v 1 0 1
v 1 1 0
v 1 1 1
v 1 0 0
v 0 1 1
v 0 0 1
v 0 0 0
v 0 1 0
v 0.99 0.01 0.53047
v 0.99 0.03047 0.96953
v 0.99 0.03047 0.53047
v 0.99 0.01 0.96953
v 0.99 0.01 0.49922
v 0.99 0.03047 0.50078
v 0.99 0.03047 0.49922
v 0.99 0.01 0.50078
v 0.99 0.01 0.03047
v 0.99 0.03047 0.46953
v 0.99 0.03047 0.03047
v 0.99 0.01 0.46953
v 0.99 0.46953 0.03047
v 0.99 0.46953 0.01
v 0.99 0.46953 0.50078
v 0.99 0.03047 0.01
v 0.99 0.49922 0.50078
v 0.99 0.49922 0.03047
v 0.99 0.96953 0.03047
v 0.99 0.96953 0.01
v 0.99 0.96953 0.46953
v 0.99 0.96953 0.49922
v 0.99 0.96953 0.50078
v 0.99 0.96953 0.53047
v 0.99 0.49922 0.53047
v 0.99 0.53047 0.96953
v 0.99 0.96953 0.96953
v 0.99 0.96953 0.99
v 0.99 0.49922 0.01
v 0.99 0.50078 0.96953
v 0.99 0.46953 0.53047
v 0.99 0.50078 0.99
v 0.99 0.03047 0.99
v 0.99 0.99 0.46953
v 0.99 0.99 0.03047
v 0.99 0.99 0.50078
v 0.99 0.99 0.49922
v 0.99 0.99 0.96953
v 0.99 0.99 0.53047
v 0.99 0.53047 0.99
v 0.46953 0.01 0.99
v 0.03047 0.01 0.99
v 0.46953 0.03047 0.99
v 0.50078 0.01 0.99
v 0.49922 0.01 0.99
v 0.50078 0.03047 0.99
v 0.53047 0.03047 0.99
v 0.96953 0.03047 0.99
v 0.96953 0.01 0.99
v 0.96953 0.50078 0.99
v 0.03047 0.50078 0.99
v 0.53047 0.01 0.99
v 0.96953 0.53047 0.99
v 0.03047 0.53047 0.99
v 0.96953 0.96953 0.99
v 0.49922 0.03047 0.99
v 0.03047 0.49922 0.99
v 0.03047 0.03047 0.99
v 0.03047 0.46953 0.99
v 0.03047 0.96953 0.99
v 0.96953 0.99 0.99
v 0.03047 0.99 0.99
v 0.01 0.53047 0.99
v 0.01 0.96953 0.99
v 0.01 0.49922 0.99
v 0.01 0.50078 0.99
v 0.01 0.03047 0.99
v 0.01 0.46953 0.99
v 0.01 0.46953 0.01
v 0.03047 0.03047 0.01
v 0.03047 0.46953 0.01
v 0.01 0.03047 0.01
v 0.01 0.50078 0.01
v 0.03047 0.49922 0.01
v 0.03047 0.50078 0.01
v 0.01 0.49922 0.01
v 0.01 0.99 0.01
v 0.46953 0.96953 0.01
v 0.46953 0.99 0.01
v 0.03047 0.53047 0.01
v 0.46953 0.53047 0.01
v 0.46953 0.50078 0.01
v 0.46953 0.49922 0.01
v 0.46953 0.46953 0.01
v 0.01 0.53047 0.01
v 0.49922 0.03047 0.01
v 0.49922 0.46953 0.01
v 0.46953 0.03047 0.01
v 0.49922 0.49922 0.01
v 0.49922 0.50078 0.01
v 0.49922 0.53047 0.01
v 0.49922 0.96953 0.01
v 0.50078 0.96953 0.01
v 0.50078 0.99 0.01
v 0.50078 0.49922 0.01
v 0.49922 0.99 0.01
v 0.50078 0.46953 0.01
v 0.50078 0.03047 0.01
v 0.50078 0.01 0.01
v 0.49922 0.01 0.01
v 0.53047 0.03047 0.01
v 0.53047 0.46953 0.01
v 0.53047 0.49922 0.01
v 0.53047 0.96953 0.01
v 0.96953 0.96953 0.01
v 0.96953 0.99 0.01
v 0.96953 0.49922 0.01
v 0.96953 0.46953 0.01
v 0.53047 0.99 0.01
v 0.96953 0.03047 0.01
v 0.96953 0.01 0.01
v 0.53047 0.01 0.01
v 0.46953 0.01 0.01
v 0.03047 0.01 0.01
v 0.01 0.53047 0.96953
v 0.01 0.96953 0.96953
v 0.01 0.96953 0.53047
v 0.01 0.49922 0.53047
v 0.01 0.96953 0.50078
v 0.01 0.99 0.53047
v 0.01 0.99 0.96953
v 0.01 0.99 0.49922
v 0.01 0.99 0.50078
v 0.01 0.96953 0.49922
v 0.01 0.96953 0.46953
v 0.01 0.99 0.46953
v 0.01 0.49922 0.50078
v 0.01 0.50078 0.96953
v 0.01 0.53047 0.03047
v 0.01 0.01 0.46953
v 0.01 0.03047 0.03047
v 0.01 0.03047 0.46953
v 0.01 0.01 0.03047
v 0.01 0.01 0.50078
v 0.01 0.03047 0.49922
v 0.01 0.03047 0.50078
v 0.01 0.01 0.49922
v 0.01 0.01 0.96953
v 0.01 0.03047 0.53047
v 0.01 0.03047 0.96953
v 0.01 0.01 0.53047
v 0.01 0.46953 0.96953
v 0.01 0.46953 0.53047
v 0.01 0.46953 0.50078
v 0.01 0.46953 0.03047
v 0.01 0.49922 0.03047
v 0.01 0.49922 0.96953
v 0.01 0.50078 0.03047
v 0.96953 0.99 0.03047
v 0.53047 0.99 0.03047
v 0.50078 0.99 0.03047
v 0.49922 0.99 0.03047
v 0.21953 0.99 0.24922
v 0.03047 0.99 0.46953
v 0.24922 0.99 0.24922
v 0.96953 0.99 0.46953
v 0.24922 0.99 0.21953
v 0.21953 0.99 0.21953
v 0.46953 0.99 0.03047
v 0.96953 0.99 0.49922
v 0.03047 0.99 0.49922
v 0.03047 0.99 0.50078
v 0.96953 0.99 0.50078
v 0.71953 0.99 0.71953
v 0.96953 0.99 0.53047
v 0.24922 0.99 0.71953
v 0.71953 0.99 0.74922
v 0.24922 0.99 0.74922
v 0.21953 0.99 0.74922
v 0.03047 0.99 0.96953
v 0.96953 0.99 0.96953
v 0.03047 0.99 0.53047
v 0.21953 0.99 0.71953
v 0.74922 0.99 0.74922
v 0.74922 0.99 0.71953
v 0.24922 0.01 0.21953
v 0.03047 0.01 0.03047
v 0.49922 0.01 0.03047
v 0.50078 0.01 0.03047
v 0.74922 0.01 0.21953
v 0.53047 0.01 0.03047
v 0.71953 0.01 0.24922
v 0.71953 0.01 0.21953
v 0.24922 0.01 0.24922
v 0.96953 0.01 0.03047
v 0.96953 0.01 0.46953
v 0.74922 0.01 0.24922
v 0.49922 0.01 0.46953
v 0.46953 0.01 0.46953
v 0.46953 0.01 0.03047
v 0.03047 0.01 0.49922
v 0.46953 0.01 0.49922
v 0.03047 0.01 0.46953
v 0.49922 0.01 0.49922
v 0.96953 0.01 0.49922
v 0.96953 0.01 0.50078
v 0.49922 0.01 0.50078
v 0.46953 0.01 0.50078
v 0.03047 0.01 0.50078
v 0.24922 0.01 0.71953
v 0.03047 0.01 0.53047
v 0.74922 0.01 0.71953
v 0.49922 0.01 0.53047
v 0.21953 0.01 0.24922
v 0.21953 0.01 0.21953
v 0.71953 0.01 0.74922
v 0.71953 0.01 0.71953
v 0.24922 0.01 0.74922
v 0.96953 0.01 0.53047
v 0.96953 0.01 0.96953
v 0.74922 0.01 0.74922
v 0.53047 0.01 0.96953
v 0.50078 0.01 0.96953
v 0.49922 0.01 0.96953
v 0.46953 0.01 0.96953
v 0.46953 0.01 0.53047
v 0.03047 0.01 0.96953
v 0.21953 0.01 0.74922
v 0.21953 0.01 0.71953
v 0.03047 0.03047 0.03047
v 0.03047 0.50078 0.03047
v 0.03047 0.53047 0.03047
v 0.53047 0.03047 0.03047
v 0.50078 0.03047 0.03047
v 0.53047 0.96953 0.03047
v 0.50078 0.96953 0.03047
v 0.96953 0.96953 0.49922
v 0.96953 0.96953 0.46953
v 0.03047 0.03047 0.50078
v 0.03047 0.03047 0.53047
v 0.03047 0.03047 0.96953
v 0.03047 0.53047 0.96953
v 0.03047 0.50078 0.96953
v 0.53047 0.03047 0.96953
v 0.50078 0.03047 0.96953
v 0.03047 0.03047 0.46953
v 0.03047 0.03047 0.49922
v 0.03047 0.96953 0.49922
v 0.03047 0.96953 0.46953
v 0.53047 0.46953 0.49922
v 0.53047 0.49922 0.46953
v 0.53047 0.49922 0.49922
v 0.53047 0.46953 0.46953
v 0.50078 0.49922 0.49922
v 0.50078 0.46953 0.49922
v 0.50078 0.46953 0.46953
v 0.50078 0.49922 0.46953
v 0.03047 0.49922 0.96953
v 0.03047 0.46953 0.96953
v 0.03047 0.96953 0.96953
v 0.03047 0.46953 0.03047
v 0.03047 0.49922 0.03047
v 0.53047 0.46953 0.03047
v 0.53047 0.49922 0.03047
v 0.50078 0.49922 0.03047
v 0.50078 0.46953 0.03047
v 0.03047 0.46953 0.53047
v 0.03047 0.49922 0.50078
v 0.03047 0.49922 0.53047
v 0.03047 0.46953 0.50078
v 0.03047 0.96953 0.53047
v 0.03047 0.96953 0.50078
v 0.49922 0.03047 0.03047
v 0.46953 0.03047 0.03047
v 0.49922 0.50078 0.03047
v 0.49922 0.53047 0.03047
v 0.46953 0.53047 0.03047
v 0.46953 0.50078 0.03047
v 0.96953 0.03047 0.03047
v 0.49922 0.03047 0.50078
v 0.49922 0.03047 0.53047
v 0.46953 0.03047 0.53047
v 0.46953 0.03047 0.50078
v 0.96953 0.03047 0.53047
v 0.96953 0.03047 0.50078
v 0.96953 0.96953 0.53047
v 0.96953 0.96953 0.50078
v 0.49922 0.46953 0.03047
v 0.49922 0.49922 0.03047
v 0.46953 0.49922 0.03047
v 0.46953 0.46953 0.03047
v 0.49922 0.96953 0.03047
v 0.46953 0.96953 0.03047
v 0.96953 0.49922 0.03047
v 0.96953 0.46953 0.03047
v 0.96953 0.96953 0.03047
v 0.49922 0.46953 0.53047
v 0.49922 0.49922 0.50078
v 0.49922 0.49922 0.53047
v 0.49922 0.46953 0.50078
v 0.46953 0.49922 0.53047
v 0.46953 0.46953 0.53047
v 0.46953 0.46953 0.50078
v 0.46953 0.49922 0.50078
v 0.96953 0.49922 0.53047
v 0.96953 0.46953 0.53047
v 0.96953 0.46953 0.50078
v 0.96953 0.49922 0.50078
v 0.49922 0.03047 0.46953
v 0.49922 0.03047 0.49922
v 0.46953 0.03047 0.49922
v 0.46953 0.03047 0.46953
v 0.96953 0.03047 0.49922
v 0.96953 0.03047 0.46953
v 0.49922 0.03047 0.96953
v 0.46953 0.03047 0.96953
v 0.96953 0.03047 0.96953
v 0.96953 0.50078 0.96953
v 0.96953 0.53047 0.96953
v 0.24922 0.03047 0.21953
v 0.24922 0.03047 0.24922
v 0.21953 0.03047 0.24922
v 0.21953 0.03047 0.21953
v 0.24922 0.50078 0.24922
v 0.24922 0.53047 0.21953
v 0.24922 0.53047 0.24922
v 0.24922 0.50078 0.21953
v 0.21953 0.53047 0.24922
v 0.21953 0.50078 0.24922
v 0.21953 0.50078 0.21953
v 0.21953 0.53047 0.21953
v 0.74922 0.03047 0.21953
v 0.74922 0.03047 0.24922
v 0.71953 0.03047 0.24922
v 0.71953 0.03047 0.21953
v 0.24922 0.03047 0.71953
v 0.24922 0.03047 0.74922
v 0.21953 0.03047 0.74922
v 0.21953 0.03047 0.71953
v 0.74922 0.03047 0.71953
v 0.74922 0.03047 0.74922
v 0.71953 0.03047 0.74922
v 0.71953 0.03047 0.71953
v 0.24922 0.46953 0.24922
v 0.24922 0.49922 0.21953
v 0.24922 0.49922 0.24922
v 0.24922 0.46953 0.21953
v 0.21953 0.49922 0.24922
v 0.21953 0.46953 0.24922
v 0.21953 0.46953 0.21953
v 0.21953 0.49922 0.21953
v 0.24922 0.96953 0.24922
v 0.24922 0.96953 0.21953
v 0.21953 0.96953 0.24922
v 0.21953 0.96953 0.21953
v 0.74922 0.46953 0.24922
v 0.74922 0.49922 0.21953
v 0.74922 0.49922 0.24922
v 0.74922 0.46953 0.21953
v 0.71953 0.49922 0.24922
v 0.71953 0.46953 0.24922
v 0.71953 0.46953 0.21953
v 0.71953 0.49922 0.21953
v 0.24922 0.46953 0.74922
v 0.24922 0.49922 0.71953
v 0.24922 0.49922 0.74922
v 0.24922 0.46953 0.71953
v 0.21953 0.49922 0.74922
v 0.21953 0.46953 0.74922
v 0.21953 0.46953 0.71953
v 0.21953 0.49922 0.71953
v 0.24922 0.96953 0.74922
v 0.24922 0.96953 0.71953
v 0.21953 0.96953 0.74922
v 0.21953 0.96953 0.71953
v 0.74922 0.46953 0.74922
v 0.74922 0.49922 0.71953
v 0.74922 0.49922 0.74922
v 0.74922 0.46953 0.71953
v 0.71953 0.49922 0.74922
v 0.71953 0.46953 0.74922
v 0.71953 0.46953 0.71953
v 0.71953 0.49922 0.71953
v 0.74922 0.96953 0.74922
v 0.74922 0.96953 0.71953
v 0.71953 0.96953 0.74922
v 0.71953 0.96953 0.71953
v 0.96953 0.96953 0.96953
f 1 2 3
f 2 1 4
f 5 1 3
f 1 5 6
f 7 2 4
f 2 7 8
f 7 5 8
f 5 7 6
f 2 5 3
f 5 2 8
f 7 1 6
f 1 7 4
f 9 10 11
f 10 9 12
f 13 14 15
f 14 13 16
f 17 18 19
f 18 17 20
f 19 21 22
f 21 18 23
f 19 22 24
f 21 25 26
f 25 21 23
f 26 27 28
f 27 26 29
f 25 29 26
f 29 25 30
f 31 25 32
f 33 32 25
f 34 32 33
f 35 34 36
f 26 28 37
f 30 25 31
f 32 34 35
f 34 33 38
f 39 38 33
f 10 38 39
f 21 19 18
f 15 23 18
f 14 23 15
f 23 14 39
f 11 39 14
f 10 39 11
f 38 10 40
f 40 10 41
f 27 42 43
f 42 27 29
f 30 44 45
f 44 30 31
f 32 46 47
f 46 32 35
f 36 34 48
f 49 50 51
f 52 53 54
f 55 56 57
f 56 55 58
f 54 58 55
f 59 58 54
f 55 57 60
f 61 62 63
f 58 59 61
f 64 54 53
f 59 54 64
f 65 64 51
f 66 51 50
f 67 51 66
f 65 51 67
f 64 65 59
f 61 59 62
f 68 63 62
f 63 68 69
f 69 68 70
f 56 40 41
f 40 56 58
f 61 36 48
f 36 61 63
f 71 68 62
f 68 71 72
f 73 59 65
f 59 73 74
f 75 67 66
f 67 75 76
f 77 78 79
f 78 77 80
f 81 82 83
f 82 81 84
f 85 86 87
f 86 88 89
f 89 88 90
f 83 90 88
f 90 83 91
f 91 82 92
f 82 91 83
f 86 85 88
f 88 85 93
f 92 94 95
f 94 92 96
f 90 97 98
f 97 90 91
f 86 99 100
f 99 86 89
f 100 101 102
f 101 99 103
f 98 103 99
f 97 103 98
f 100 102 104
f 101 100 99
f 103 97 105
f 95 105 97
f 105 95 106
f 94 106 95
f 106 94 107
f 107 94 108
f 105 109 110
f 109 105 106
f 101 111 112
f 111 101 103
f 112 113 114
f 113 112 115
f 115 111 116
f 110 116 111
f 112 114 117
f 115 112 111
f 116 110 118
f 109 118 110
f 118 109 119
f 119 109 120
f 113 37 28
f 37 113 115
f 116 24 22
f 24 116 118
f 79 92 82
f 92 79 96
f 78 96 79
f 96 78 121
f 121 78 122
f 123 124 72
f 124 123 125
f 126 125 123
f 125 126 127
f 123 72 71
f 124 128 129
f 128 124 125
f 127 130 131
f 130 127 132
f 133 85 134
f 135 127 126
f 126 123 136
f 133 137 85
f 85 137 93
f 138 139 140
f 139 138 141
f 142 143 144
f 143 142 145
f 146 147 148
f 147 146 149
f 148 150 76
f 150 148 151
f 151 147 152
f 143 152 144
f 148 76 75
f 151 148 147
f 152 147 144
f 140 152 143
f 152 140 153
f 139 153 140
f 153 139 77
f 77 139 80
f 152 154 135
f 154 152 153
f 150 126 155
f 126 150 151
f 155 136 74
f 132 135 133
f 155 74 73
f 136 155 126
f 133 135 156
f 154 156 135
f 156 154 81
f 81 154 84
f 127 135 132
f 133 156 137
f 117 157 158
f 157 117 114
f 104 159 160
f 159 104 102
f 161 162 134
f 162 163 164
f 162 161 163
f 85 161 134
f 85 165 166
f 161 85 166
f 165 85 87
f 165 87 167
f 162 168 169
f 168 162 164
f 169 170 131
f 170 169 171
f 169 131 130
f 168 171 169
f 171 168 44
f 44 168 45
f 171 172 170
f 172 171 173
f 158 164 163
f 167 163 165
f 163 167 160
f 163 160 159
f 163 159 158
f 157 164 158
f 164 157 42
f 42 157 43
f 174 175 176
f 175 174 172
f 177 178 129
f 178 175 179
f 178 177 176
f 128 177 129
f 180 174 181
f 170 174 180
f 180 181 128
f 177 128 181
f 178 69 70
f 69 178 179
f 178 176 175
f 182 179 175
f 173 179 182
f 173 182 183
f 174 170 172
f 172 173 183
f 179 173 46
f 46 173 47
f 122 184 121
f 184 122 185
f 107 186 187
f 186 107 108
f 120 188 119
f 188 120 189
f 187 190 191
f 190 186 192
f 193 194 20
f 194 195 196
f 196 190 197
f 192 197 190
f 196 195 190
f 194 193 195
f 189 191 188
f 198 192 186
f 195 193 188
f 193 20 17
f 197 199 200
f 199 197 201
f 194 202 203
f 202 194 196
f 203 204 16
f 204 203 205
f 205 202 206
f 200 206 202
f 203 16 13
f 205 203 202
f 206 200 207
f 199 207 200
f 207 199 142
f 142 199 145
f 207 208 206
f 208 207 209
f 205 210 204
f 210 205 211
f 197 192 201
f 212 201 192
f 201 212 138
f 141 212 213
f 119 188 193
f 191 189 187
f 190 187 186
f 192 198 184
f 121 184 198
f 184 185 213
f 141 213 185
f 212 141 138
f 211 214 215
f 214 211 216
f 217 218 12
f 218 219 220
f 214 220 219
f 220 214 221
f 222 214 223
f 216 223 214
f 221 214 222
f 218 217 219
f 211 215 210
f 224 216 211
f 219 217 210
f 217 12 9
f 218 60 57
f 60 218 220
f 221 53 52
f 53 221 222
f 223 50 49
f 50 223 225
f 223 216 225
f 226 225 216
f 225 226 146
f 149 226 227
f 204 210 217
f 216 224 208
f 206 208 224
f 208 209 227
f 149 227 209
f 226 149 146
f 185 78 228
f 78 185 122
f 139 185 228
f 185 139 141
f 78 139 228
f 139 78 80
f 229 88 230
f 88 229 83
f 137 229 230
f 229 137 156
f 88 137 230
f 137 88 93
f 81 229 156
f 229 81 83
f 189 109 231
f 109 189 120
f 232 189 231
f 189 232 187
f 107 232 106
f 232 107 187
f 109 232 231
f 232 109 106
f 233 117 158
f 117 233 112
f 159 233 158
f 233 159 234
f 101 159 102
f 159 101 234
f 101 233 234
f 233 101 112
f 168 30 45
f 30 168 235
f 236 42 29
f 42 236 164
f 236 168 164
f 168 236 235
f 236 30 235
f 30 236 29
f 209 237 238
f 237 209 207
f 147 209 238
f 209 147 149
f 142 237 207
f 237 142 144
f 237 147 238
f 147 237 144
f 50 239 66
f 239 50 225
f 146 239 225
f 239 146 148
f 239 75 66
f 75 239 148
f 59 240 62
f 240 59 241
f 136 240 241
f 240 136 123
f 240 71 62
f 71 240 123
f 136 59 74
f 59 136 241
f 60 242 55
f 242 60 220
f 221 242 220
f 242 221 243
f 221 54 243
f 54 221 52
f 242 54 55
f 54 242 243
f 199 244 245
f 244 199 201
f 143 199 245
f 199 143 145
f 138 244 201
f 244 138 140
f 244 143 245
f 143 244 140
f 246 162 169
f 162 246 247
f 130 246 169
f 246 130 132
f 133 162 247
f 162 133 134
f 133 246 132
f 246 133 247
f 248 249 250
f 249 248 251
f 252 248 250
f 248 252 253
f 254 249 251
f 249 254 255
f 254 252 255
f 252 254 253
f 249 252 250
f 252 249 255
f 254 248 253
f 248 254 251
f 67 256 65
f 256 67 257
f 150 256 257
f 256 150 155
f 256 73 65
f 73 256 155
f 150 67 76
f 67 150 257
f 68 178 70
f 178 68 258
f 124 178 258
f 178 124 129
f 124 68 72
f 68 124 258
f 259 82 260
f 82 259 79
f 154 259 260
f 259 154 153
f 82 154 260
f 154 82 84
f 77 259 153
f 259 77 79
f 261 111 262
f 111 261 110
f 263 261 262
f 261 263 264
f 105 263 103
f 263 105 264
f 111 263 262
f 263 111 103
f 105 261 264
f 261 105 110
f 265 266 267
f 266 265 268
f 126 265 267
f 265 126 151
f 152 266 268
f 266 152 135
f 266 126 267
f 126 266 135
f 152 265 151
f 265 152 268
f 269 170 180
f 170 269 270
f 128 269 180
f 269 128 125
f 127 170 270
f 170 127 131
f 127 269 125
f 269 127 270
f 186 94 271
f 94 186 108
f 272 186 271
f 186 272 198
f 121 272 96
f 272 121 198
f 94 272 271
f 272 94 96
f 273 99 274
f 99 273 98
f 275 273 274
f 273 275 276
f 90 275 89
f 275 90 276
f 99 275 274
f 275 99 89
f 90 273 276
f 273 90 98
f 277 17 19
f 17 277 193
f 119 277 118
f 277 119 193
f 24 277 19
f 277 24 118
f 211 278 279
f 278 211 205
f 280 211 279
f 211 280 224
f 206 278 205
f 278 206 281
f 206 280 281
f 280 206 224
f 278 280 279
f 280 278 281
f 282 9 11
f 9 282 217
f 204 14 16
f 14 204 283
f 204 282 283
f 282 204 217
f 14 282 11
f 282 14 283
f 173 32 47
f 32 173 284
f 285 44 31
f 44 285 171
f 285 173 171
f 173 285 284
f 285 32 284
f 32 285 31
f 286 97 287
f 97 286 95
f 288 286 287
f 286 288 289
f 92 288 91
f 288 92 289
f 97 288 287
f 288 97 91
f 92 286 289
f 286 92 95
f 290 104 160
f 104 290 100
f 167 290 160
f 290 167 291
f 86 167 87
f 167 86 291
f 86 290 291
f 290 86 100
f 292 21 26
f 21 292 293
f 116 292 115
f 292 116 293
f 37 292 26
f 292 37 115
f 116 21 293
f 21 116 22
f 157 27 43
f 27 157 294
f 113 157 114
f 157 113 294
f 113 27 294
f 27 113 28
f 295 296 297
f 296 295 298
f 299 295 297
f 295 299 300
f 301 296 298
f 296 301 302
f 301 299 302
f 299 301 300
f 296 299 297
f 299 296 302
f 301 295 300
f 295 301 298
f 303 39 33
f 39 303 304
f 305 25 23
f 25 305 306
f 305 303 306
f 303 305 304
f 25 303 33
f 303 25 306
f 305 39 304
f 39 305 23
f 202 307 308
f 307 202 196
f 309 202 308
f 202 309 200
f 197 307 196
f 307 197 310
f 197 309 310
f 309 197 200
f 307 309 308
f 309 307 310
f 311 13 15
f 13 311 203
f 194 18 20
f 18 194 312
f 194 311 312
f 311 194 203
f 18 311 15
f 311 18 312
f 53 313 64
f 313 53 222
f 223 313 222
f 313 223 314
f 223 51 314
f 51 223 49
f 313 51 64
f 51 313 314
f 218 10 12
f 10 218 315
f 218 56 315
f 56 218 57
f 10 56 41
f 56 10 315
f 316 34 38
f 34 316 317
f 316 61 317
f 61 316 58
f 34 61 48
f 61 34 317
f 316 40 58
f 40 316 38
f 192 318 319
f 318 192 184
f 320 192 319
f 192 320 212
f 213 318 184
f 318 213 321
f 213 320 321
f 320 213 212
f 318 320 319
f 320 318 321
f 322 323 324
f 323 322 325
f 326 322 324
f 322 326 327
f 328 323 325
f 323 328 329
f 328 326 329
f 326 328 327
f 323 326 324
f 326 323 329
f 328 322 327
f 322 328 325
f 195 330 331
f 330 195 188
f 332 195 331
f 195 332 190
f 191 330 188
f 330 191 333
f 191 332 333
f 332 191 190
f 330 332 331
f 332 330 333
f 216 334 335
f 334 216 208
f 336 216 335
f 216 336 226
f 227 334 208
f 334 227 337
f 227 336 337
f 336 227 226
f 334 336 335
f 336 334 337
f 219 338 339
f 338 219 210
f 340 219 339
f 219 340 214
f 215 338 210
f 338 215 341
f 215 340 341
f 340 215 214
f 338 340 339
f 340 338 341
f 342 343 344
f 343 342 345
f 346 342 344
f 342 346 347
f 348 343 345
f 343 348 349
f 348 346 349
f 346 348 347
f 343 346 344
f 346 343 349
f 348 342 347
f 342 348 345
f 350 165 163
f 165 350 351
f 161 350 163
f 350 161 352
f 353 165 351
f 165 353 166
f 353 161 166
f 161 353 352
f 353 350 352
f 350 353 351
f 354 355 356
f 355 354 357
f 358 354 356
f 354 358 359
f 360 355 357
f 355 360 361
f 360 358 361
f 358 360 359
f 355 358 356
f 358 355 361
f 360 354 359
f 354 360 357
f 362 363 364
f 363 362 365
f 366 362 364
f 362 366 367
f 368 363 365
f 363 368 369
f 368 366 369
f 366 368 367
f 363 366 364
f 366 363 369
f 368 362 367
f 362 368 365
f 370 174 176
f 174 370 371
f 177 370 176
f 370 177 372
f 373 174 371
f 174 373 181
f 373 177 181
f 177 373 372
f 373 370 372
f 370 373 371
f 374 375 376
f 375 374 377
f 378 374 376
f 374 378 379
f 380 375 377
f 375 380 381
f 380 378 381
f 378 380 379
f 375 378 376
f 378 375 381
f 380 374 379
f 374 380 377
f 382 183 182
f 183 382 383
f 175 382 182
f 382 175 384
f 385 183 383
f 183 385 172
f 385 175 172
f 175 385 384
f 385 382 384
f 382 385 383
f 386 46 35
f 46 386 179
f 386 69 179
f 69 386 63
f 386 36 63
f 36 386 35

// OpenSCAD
translate([0.015625, 0.015625, 0.015625]) color([0.606331596350091, 0.5638715169289779, 0.6821550915760055]) cube([0.0296875, 0.0296875, 0.0296875], center=true);
translate([0.015625, 0.515625, 0.015625]) color([0.4082276350397991, 0.8742223240372553, 0.3540626401036049]) cube([0.0296875, 0.0296875, 0.0296875], center=true);
translate([0.515625, 0.015625, 0.015625]) color([0.4864439318669388, 0.7267610567114519, 0.17226198546807925]) cube([0.0296875, 0.0296875, 0.0296875], center=true);
translate([0.515625, 0.984375, 0.015625]) color([0.5917058516267724, 0.21068341757105835, 0.8879076773151368]) cube([0.0296875, 0.0296875, 0.0296875], center=true);
translate([0.984375, 0.984375, 0.484375]) color([0.07934250488153727, 0.35071163644577374, 0.8793032078941269]) cube([0.0296875, 0.0296875, 0.0296875], center=true);
translate([0.015625, 0.015625, 0.515625]) color([0.24478782051465153, 0.7255438646626325, 0.6894029863329633]) cube([0.0296875, 0.0296875, 0.0296875], center=true);
translate([0.015625, 0.015625, 0.984375]) color([0.6241975238236468, 0.7365438178391559, 0.2126760943996696]) cube([0.0296875, 0.0296875, 0.0296875], center=true);
translate([0.015625, 0.515625, 0.984375]) color([0.41934790856937065, 0.8807606289371145, 0.9259211755306935]) cube([0.0296875, 0.0296875, 0.0296875], center=true);
translate([0.515625, 0.015625, 0.984375]) color([0.9794472475647192, 0.2938346216214669, 0.0272441660653141]) cube([0.0296875, 0.0296875, 0.0296875], center=true);
translate([0.015625, 0.015625, 0.484375]) color([0.6910205293314161, 0.5094000939198804, 0.5052624801059714]) cube([0.0296875, 0.0296875, 0.0296875], center=true);
translate([0.015625, 0.984375, 0.484375]) color([0.9937467490068713, 0.052986742925941854, 0.14536169078633177]) cube([0.0296875, 0.0296875, 0.0296875], center=true);
translate([0.515625, 0.484375, 0.484375]) color([0.05142027398452964, 0.9735218258566558, 0.047591888593015]) cube([0.0296875, 0.0296875, 0.0296875], center=true);
translate([0.015625, 0.484375, 0.984375]) color([0.8117500261145564, 0.1615065561540321, 0.3411082674078115]) cube([0.0296875, 0.0296875, 0.0296875], center=true);
translate([0.015625, 0.984375, 0.984375]) color([0.14556283410772275, 0.1669050296719239, 0.2126506408007548]) cube([0.0296875, 0.0296875, 0.0296875], center=true);
translate([0.015625, 0.484375, 0.015625]) color([0.1643781309953597, 0.1969053124243212, 0.8923696098751848]) cube([0.0296875, 0.0296875, 0.0296875], center=true);
translate([0.515625, 0.484375, 0.015625]) color([0.6524445092977721, 0.27717367144232374, 0.36665226255557337]) cube([0.0296875, 0.0296875, 0.0296875], center=true);
translate([0.015625, 0.484375, 0.515625]) color([0.28280230463247347, 0.3982188312652467, 0.8731076904851287]) cube([0.0296875, 0.0296875, 0.0296875], center=true);
translate([0.015625, 0.984375, 0.515625]) color([0.951068245159231, 0.9645876729249203, 0.1649882215820635]) cube([0.0296875, 0.0296875, 0.0296875], center=true);
translate([0.484375, 0.015625, 0.015625]) color([0.85781092577519, 0.30052632891855435, 0.16180594642971435]) cube([0.0296875, 0.0296875, 0.0296875], center=true);
translate([0.484375, 0.515625, 0.015625]) color([0.4027663718100136, 0.6577212462700855, 0.6898864362311222]) cube([0.0296875, 0.0296875, 0.0296875], center=true);
translate([0.984375, 0.015625, 0.015625]) color([0.9054447882857072, 0.7509014738189853, 0.1895263609282205]) cube([0.0296875, 0.0296875, 0.0296875], center=true);
translate([0.484375, 0.015625, 0.515625]) color([0.45596485047959523, 0.8783351779475488, 0.4538518730840495]) cube([0.0296875, 0.0296875, 0.0296875], center=true);
translate([0.984375, 0.015625, 0.515625]) color([0.392660976888327, 0.856988482484495, 0.6201647902220953]) cube([0.0296875, 0.0296875, 0.0296875], center=true);
translate([0.984375, 0.984375, 0.515625]) color([0.29061826466264573, 0.962227894906525, 0.8675314723906767]) cube([0.0296875, 0.0296875, 0.0296875], center=true);
translate([0.484375, 0.484375, 0.015625]) color([0.8803060724684076, 0.8138480179101812, 0.7400092052970599]) cube([0.0296875, 0.0296875, 0.0296875], center=true);
translate([0.484375, 0.984375, 0.015625]) color([0.5394445544845855, 0.5760594201823124, 0.5958853169652069]) cube([0.0296875, 0.0296875, 0.0296875], center=true);
translate([0.984375, 0.484375, 0.015625]) color([0.9765395534020428, 0.1829668899751793, 0.7537025803929293]) cube([0.0296875, 0.0296875, 0.0296875], center=true);
translate([0.984375, 0.984375, 0.015625]) color([0.6030052593528492, 0.2876412521642051, 0.6348976512769944]) cube([0.0296875, 0.0296875, 0.0296875], center=true);
translate([0.484375, 0.484375, 0.515625]) color([0.7277197744124063, 0.35444110935932793, 0.13099720777835244]) cube([0.0296875, 0.0296875, 0.0296875], center=true);
translate([0.984375, 0.484375, 0.515625]) color([0.4028586833174501, 0.6909489908116095, 0.5046977059005883]) cube([0.0296875, 0.0296875, 0.0296875], center=true);
translate([0.484375, 0.015625, 0.484375]) color([0.9629492600241728, 0.26191874219651334, 0.04834033943485738]) cube([0.0296875, 0.0296875, 0.0296875], center=true);
translate([0.984375, 0.015625, 0.484375]) color([0.45923032237186845, 0.009528131294201714, 0.502466895235334]) cube([0.0296875, 0.0296875, 0.0296875], center=true);
translate([0.484375, 0.015625, 0.984375]) color([0.28668854888236694, 0.691988813393134, 0.7039243500182285]) cube([0.0296875, 0.0296875, 0.0296875], center=true);
translate([0.984375, 0.015625, 0.984375]) color([0.6909228597729594, 0.6425067308098993, 0.8260971072391406]) cube([0.0296875, 0.0296875, 0.0296875], center=true);
translate([0.984375, 0.515625, 0.984375]) color([0.9493344595797667, 0.3534564548141357, 0.5797180935726473]) cube([0.0296875, 0.0296875, 0.0296875], center=true);
translate([0.234375, 0.015625, 0.234375]) color([0.7810705573282835, 0.2844853183364905, 0.2538937908972332]) cube([0.0296875, 0.0296875, 0.0296875], center=true);
translate([0.234375, 0.515625, 0.234375]) color([0.5787285323695237, 0.11539312184696959, 0.8023856460035432]) cube([0.0296875, 0.0296875, 0.0296875], center=true);
translate([0.734375, 0.015625, 0.234375]) color([0.21861457317165833, 0.8676945440438885, 0.5076736037058898]) cube([0.0296875, 0.0296875, 0.0296875], center=true);
translate([0.234375, 0.015625, 0.734375]) color([0.7138499686467532, 0.22713272906273496, 0.19390251356413268]) cube([0.0296875, 0.0296875, 0.0296875], center=true);
translate([0.734375, 0.015625, 0.734375]) color([0.8240740032726942, 0.6733086943972952, 0.42782145262094673]) cube([0.0296875, 0.0296875, 0.0296875], center=true);
translate([0.234375, 0.484375, 0.234375]) color([0.8852650888181466, 0.06739856337172401, 0.6884111402324574]) cube([0.0296875, 0.0296875, 0.0296875], center=true);
translate([0.234375, 0.984375, 0.234375]) color([0.9973030967892196, 0.7409370940146432, 0.06492133544831458]) cube([0.0296875, 0.0296875, 0.0296875], center=true);
translate([0.734375, 0.484375, 0.234375]) color([0.7942364824350366, 0.3053909315102985, 0.8216686663682834]) cube([0.0296875, 0.0296875, 0.0296875], center=true);
translate([0.234375, 0.484375, 0.734375]) color([0.8459339369028931, 0.10292352286401718, 0.3596183375652757]) cube([0.0296875, 0.0296875, 0.0296875], center=true);
translate([0.234375, 0.984375, 0.734375]) color([0.09283318422206643, 0.1574888597405516, 0.05329512929812119]) cube([0.0296875, 0.0296875, 0.0296875], center=true);
translate([0.734375, 0.484375, 0.734375]) color([0.2699146760255431, 0.04789901746797298, 0.5311955905083697]) cube([0.0296875, 0.0296875, 0.0296875], center=true);
translate([0.734375, 0.984375, 0.734375]) color([0.6347236326985357, 0.22194381133175534, 0.7589835239916253]) cube([0.0296875, 0.0296875, 0.0296875], center=true);
translate([0.984375, 0.984375, 0.984375]) color([0.6022590362463128, 0.030652426287076096, 0.2834486040351434]) cube([0.0296875, 0.0296875, 0.0296875], center=true);
color([0.3,0.3,0.3,0.3]) difference() { cube([1,1,1]); translate([0.01,0.01,0.01]) cube([0.98,0.98,0.98]); }
